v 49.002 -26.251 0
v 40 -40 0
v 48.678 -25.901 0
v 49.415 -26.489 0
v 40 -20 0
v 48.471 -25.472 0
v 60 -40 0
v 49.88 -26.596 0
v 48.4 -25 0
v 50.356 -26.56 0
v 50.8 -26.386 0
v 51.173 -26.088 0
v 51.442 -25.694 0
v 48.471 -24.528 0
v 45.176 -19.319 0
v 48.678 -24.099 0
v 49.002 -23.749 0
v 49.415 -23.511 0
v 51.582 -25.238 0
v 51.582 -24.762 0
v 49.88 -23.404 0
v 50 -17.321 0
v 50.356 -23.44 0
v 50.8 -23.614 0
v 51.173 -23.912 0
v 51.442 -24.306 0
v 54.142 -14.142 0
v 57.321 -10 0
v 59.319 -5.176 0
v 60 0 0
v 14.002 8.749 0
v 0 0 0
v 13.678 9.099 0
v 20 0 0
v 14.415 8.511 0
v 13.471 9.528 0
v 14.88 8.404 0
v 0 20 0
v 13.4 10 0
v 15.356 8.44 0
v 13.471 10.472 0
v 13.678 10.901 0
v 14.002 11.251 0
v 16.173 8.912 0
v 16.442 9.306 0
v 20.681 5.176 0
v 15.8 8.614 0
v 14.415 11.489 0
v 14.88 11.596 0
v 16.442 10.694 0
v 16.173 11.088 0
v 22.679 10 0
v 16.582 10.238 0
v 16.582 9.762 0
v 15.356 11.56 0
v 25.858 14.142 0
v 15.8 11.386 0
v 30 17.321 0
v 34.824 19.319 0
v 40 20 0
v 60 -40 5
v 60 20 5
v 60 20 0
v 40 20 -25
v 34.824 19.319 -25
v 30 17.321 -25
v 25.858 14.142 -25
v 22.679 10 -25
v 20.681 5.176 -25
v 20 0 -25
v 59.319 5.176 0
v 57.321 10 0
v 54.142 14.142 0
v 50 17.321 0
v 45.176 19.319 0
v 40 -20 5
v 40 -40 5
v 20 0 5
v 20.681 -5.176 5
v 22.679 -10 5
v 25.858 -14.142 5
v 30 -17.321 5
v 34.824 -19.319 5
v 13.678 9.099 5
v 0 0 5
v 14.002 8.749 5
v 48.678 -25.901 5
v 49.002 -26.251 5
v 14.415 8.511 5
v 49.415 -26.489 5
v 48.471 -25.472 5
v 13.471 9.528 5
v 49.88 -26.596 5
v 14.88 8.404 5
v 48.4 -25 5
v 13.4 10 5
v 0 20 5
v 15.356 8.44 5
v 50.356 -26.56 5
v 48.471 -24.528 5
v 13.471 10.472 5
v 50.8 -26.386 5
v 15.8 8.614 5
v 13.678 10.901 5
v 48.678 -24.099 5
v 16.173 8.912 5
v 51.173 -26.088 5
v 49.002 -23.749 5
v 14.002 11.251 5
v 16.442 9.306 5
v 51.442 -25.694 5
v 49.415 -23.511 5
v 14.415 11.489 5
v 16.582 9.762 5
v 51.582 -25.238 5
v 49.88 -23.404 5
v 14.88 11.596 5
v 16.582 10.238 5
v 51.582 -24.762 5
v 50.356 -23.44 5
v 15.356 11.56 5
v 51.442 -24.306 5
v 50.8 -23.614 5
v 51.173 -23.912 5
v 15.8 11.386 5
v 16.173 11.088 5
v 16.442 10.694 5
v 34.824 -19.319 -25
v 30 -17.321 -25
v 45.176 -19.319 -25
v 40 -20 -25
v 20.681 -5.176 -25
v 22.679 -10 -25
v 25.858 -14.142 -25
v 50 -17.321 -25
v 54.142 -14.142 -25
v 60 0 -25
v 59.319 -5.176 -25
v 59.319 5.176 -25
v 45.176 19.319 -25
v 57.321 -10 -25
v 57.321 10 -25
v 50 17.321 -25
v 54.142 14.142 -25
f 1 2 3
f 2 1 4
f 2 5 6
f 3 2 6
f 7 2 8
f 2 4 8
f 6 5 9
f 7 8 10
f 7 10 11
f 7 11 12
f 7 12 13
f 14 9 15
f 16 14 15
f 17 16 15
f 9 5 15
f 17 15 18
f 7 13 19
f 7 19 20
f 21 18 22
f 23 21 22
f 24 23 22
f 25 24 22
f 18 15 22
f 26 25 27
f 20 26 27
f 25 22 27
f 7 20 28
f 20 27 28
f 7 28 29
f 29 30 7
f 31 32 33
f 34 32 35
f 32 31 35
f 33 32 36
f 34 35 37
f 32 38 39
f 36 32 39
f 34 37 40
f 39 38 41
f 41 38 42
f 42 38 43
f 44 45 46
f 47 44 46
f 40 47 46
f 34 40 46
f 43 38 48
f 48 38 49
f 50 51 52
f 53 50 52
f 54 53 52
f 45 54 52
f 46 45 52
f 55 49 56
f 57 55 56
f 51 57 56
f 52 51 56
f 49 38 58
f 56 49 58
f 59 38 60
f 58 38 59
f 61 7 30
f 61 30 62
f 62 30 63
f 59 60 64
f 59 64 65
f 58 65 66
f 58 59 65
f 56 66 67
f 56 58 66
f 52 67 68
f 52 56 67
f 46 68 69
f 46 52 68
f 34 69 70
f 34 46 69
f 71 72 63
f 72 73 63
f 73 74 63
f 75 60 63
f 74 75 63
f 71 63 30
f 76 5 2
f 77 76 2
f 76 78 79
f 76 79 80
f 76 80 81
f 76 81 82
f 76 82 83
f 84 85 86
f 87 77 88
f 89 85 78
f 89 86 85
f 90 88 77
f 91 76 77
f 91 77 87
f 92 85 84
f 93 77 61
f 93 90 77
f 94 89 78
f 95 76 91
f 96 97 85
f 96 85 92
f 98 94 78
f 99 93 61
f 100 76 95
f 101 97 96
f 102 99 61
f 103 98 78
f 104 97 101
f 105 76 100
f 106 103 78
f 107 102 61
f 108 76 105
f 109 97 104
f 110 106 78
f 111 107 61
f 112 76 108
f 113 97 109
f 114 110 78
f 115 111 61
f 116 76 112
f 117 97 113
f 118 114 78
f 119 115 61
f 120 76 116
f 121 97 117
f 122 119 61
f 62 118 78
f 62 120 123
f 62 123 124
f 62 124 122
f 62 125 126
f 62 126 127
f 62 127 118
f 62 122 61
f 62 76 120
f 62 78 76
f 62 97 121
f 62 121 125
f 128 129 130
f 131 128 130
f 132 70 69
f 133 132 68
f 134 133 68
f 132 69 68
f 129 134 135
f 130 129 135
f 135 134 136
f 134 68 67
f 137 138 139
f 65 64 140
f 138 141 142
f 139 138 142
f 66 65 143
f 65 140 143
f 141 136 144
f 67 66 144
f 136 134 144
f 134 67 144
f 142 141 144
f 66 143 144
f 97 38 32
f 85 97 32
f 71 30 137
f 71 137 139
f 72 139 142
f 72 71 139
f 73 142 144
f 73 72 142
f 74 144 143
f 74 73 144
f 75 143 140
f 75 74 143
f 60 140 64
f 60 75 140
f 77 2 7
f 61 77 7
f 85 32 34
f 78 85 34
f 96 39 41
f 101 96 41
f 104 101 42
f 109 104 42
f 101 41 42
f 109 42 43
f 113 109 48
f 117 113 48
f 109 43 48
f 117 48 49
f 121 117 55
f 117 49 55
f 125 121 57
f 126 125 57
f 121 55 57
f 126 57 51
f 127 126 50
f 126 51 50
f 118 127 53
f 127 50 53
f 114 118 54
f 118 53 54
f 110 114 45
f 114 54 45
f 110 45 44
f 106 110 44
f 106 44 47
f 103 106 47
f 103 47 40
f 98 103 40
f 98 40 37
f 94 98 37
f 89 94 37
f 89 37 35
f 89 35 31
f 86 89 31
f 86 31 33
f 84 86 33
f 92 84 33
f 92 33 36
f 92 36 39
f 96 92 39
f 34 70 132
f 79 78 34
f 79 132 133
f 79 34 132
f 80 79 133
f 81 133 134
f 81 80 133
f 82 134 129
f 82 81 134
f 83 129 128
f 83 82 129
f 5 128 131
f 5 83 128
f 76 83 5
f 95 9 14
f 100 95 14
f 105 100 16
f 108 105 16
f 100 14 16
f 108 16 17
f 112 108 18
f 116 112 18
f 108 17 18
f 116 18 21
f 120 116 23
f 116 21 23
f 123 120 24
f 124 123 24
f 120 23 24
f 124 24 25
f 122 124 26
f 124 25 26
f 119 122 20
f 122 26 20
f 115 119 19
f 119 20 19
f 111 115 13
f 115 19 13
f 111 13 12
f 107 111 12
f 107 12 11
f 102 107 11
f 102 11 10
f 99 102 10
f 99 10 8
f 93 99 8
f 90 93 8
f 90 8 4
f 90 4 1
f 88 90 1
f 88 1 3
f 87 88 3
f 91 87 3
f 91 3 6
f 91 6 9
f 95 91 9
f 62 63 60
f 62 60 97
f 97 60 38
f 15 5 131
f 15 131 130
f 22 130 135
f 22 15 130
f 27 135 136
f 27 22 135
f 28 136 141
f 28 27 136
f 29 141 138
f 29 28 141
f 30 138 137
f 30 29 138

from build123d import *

# Parameters (mm, degrees)
F1_DEPTH = 5
F3_D     = 3.2
F5_DEPTH = 30


with BuildPart() as f1:
    # F0 (on Top) → F1 (new body)
    with BuildSketch(Plane.XY):
        Polygon((0, 20), (0, 0), (40, 0), (40, -40), (60, -40), (60, 20), align=None)
    extrude(amount=F1_DEPTH)

    # F3 (through all)
    with Locations(Plane.XY.offset(5)):
        with Locations((15, 10), (50, -25)):
            Hole(F3_D / 2)

    # F4 (on face) → F5 (join)
    with BuildSketch(Plane.XY.offset(5)):
        with BuildLine():
            ThreePointArc((40, -20), (54.1421356237, -14.1421356237), (60, 0))
            ThreePointArc((60, 0), (54.1421356237, 14.1421356237), (40, 20))
            ThreePointArc((40, 20), (25.8578643763, 14.1421356237), (20, 0))
            Line((20, 0), (40, 0))
            Line((40, 0), (40, -20))
        make_face()
        with BuildLine():
            ThreePointArc((20, 0), (25.8578643763, -14.1421356237), (40, -20))
            Line((40, -20), (40, 0))
            Line((40, 0), (20, 0))
        make_face()
    extrude(amount=-F5_DEPTH)


solid = f1.part
